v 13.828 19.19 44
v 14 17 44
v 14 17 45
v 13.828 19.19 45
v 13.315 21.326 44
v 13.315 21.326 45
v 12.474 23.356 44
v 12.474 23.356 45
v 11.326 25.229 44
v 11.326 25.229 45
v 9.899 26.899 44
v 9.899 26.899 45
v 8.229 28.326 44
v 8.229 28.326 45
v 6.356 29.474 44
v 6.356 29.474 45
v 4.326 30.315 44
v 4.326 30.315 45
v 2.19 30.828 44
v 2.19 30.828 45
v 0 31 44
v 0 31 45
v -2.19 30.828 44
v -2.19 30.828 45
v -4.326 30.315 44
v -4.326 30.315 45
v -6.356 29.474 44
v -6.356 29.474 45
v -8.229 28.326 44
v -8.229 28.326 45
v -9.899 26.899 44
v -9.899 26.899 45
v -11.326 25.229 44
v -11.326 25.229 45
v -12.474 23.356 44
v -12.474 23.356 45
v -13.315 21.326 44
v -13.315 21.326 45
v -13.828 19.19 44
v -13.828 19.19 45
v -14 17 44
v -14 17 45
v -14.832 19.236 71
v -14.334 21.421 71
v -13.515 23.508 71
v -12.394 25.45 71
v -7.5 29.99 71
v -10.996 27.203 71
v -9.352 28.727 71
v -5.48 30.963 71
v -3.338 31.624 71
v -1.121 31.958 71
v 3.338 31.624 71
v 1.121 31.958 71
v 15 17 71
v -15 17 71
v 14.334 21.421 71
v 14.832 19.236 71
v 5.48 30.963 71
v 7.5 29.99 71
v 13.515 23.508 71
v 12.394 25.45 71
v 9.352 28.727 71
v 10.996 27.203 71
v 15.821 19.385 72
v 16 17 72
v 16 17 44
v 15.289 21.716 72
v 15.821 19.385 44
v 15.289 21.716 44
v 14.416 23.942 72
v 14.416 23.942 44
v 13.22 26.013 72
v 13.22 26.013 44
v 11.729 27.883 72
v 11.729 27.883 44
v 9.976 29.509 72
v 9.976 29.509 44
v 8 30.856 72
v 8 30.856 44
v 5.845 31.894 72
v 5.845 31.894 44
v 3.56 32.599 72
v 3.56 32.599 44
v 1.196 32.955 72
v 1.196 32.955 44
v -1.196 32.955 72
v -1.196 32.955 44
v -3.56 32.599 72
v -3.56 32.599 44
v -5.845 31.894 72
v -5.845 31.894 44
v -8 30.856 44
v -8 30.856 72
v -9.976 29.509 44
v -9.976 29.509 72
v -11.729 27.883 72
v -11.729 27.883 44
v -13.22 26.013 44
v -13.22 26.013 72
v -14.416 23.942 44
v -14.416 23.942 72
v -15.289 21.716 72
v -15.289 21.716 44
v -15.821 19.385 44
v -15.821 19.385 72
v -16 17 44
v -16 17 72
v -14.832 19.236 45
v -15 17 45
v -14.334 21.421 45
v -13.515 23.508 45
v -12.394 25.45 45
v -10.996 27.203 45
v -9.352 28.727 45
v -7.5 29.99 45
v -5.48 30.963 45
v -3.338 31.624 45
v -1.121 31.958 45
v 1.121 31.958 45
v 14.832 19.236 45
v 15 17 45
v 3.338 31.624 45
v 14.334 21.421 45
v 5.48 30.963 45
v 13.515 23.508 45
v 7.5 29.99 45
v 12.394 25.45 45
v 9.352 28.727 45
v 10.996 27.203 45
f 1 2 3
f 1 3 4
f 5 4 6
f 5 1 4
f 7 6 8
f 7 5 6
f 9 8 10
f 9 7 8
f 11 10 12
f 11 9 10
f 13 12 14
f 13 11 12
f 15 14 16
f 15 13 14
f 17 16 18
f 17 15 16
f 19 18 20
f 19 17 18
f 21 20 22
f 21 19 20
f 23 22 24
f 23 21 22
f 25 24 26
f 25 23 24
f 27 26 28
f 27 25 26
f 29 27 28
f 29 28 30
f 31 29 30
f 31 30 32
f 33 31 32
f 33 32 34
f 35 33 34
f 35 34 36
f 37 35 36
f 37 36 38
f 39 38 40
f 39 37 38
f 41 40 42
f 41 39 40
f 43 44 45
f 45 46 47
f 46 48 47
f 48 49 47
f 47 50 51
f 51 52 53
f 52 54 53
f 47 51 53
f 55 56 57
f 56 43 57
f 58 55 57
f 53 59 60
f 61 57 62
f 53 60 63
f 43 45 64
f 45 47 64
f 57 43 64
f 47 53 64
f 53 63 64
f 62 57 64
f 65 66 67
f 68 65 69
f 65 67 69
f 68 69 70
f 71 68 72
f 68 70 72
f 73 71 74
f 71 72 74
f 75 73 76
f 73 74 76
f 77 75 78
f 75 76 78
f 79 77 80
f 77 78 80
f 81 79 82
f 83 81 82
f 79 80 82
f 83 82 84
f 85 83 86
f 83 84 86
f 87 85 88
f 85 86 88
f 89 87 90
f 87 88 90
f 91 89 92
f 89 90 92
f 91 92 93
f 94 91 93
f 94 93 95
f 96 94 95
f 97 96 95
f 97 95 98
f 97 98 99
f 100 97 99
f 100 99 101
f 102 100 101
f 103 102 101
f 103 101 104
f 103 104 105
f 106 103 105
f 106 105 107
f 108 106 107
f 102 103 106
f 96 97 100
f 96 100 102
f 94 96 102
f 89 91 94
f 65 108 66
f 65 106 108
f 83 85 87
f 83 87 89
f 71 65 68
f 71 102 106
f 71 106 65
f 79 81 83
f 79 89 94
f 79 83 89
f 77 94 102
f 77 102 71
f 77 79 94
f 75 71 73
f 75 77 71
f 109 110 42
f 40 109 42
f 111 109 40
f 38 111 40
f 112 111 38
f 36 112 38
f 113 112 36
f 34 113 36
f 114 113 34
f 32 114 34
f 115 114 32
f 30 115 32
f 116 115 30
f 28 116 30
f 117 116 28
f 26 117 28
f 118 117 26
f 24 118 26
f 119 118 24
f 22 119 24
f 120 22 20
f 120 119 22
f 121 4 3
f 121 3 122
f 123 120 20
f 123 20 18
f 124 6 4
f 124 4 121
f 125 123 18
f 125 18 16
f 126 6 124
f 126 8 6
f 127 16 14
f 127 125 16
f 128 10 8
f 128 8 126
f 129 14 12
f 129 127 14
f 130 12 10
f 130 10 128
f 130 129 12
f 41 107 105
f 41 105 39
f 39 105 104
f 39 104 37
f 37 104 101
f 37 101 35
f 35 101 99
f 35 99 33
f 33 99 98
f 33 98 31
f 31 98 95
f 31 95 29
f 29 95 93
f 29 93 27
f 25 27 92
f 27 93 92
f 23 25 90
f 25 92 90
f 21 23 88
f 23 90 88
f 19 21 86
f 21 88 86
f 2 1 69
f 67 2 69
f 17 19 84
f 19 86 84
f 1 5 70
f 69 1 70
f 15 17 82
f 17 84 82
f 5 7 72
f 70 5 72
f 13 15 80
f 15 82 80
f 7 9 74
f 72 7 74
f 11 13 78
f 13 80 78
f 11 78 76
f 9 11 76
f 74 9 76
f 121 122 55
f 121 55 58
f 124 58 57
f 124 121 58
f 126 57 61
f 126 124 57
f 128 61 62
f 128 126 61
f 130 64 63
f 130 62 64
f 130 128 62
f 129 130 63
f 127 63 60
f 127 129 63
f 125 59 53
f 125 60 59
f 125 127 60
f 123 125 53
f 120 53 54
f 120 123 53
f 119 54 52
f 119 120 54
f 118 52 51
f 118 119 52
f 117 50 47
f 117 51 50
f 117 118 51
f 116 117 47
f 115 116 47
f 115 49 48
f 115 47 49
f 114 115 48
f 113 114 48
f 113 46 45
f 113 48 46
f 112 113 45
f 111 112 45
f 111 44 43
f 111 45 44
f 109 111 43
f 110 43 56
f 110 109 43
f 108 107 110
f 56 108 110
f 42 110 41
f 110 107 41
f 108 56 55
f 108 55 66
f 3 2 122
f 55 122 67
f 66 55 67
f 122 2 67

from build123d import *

# Parameters (mm, degrees)
CYLINDER033_R     = 14
CYLINDER033_DEPTH = 20
BOX_W             = 36
BOX_H             = 16
BOX_DEPTH         = 41
CYLINDER030_R     = 16
CYLINDER030_DEPTH = 28
THICKNESS001_T    = -1


with BuildPart() as cilindro013:
    # Cylinder033 → Cylinder033 (new body)
    with BuildSketch(Plane(origin=(0, 17, 40), x_dir=(1, 0, 0), z_dir=(0, 0, 1))):
        Circle(CYLINDER033_R)
    extrude(amount=CYLINDER033_DEPTH)


with BuildPart() as cubo:
    # Box → Box (new body)
    with BuildSketch(Plane(origin=(-19, 1, 45), x_dir=(1, 0, 0), z_dir=(0, 0, 1))):
        with Locations((18, 8)):
            Rectangle(BOX_W, BOX_H)
    extrude(amount=BOX_DEPTH)


with BuildPart() as cut013016:
    # Cylinder030 → Cylinder030 (new body)
    with BuildSketch(Plane(origin=(0, 17, 45), x_dir=(1, 0, 0), z_dir=(0, 0, 1))):
        Circle(CYLINDER030_R)
    extrude(amount=CYLINDER030_DEPTH)

    # Cut013013: cut Cubo
    add(cubo.part, mode=Mode.SUBTRACT)


with BuildPart() as cut013016_1:
    # Cut013013 placement: moved
    add(cut013016.part.moved(Location((0, 5, 1))))

    # Thickness001
    thickness001_openings = [cut013016_1.faces().sort_by_distance(p)[0] for p in [
        (0, 22, 60),
    ]]
    offset(amount=THICKNESS001_T, openings=thickness001_openings)


with BuildPart() as cut013016_2:
    # Thickness001 placement: moved
    add(cut013016_1.part.moved(Location((0, -5, -2))))

    # Cut013016: cut Cilindro013
    add(cilindro013.part, mode=Mode.SUBTRACT)


solid = cut013016_2.part
